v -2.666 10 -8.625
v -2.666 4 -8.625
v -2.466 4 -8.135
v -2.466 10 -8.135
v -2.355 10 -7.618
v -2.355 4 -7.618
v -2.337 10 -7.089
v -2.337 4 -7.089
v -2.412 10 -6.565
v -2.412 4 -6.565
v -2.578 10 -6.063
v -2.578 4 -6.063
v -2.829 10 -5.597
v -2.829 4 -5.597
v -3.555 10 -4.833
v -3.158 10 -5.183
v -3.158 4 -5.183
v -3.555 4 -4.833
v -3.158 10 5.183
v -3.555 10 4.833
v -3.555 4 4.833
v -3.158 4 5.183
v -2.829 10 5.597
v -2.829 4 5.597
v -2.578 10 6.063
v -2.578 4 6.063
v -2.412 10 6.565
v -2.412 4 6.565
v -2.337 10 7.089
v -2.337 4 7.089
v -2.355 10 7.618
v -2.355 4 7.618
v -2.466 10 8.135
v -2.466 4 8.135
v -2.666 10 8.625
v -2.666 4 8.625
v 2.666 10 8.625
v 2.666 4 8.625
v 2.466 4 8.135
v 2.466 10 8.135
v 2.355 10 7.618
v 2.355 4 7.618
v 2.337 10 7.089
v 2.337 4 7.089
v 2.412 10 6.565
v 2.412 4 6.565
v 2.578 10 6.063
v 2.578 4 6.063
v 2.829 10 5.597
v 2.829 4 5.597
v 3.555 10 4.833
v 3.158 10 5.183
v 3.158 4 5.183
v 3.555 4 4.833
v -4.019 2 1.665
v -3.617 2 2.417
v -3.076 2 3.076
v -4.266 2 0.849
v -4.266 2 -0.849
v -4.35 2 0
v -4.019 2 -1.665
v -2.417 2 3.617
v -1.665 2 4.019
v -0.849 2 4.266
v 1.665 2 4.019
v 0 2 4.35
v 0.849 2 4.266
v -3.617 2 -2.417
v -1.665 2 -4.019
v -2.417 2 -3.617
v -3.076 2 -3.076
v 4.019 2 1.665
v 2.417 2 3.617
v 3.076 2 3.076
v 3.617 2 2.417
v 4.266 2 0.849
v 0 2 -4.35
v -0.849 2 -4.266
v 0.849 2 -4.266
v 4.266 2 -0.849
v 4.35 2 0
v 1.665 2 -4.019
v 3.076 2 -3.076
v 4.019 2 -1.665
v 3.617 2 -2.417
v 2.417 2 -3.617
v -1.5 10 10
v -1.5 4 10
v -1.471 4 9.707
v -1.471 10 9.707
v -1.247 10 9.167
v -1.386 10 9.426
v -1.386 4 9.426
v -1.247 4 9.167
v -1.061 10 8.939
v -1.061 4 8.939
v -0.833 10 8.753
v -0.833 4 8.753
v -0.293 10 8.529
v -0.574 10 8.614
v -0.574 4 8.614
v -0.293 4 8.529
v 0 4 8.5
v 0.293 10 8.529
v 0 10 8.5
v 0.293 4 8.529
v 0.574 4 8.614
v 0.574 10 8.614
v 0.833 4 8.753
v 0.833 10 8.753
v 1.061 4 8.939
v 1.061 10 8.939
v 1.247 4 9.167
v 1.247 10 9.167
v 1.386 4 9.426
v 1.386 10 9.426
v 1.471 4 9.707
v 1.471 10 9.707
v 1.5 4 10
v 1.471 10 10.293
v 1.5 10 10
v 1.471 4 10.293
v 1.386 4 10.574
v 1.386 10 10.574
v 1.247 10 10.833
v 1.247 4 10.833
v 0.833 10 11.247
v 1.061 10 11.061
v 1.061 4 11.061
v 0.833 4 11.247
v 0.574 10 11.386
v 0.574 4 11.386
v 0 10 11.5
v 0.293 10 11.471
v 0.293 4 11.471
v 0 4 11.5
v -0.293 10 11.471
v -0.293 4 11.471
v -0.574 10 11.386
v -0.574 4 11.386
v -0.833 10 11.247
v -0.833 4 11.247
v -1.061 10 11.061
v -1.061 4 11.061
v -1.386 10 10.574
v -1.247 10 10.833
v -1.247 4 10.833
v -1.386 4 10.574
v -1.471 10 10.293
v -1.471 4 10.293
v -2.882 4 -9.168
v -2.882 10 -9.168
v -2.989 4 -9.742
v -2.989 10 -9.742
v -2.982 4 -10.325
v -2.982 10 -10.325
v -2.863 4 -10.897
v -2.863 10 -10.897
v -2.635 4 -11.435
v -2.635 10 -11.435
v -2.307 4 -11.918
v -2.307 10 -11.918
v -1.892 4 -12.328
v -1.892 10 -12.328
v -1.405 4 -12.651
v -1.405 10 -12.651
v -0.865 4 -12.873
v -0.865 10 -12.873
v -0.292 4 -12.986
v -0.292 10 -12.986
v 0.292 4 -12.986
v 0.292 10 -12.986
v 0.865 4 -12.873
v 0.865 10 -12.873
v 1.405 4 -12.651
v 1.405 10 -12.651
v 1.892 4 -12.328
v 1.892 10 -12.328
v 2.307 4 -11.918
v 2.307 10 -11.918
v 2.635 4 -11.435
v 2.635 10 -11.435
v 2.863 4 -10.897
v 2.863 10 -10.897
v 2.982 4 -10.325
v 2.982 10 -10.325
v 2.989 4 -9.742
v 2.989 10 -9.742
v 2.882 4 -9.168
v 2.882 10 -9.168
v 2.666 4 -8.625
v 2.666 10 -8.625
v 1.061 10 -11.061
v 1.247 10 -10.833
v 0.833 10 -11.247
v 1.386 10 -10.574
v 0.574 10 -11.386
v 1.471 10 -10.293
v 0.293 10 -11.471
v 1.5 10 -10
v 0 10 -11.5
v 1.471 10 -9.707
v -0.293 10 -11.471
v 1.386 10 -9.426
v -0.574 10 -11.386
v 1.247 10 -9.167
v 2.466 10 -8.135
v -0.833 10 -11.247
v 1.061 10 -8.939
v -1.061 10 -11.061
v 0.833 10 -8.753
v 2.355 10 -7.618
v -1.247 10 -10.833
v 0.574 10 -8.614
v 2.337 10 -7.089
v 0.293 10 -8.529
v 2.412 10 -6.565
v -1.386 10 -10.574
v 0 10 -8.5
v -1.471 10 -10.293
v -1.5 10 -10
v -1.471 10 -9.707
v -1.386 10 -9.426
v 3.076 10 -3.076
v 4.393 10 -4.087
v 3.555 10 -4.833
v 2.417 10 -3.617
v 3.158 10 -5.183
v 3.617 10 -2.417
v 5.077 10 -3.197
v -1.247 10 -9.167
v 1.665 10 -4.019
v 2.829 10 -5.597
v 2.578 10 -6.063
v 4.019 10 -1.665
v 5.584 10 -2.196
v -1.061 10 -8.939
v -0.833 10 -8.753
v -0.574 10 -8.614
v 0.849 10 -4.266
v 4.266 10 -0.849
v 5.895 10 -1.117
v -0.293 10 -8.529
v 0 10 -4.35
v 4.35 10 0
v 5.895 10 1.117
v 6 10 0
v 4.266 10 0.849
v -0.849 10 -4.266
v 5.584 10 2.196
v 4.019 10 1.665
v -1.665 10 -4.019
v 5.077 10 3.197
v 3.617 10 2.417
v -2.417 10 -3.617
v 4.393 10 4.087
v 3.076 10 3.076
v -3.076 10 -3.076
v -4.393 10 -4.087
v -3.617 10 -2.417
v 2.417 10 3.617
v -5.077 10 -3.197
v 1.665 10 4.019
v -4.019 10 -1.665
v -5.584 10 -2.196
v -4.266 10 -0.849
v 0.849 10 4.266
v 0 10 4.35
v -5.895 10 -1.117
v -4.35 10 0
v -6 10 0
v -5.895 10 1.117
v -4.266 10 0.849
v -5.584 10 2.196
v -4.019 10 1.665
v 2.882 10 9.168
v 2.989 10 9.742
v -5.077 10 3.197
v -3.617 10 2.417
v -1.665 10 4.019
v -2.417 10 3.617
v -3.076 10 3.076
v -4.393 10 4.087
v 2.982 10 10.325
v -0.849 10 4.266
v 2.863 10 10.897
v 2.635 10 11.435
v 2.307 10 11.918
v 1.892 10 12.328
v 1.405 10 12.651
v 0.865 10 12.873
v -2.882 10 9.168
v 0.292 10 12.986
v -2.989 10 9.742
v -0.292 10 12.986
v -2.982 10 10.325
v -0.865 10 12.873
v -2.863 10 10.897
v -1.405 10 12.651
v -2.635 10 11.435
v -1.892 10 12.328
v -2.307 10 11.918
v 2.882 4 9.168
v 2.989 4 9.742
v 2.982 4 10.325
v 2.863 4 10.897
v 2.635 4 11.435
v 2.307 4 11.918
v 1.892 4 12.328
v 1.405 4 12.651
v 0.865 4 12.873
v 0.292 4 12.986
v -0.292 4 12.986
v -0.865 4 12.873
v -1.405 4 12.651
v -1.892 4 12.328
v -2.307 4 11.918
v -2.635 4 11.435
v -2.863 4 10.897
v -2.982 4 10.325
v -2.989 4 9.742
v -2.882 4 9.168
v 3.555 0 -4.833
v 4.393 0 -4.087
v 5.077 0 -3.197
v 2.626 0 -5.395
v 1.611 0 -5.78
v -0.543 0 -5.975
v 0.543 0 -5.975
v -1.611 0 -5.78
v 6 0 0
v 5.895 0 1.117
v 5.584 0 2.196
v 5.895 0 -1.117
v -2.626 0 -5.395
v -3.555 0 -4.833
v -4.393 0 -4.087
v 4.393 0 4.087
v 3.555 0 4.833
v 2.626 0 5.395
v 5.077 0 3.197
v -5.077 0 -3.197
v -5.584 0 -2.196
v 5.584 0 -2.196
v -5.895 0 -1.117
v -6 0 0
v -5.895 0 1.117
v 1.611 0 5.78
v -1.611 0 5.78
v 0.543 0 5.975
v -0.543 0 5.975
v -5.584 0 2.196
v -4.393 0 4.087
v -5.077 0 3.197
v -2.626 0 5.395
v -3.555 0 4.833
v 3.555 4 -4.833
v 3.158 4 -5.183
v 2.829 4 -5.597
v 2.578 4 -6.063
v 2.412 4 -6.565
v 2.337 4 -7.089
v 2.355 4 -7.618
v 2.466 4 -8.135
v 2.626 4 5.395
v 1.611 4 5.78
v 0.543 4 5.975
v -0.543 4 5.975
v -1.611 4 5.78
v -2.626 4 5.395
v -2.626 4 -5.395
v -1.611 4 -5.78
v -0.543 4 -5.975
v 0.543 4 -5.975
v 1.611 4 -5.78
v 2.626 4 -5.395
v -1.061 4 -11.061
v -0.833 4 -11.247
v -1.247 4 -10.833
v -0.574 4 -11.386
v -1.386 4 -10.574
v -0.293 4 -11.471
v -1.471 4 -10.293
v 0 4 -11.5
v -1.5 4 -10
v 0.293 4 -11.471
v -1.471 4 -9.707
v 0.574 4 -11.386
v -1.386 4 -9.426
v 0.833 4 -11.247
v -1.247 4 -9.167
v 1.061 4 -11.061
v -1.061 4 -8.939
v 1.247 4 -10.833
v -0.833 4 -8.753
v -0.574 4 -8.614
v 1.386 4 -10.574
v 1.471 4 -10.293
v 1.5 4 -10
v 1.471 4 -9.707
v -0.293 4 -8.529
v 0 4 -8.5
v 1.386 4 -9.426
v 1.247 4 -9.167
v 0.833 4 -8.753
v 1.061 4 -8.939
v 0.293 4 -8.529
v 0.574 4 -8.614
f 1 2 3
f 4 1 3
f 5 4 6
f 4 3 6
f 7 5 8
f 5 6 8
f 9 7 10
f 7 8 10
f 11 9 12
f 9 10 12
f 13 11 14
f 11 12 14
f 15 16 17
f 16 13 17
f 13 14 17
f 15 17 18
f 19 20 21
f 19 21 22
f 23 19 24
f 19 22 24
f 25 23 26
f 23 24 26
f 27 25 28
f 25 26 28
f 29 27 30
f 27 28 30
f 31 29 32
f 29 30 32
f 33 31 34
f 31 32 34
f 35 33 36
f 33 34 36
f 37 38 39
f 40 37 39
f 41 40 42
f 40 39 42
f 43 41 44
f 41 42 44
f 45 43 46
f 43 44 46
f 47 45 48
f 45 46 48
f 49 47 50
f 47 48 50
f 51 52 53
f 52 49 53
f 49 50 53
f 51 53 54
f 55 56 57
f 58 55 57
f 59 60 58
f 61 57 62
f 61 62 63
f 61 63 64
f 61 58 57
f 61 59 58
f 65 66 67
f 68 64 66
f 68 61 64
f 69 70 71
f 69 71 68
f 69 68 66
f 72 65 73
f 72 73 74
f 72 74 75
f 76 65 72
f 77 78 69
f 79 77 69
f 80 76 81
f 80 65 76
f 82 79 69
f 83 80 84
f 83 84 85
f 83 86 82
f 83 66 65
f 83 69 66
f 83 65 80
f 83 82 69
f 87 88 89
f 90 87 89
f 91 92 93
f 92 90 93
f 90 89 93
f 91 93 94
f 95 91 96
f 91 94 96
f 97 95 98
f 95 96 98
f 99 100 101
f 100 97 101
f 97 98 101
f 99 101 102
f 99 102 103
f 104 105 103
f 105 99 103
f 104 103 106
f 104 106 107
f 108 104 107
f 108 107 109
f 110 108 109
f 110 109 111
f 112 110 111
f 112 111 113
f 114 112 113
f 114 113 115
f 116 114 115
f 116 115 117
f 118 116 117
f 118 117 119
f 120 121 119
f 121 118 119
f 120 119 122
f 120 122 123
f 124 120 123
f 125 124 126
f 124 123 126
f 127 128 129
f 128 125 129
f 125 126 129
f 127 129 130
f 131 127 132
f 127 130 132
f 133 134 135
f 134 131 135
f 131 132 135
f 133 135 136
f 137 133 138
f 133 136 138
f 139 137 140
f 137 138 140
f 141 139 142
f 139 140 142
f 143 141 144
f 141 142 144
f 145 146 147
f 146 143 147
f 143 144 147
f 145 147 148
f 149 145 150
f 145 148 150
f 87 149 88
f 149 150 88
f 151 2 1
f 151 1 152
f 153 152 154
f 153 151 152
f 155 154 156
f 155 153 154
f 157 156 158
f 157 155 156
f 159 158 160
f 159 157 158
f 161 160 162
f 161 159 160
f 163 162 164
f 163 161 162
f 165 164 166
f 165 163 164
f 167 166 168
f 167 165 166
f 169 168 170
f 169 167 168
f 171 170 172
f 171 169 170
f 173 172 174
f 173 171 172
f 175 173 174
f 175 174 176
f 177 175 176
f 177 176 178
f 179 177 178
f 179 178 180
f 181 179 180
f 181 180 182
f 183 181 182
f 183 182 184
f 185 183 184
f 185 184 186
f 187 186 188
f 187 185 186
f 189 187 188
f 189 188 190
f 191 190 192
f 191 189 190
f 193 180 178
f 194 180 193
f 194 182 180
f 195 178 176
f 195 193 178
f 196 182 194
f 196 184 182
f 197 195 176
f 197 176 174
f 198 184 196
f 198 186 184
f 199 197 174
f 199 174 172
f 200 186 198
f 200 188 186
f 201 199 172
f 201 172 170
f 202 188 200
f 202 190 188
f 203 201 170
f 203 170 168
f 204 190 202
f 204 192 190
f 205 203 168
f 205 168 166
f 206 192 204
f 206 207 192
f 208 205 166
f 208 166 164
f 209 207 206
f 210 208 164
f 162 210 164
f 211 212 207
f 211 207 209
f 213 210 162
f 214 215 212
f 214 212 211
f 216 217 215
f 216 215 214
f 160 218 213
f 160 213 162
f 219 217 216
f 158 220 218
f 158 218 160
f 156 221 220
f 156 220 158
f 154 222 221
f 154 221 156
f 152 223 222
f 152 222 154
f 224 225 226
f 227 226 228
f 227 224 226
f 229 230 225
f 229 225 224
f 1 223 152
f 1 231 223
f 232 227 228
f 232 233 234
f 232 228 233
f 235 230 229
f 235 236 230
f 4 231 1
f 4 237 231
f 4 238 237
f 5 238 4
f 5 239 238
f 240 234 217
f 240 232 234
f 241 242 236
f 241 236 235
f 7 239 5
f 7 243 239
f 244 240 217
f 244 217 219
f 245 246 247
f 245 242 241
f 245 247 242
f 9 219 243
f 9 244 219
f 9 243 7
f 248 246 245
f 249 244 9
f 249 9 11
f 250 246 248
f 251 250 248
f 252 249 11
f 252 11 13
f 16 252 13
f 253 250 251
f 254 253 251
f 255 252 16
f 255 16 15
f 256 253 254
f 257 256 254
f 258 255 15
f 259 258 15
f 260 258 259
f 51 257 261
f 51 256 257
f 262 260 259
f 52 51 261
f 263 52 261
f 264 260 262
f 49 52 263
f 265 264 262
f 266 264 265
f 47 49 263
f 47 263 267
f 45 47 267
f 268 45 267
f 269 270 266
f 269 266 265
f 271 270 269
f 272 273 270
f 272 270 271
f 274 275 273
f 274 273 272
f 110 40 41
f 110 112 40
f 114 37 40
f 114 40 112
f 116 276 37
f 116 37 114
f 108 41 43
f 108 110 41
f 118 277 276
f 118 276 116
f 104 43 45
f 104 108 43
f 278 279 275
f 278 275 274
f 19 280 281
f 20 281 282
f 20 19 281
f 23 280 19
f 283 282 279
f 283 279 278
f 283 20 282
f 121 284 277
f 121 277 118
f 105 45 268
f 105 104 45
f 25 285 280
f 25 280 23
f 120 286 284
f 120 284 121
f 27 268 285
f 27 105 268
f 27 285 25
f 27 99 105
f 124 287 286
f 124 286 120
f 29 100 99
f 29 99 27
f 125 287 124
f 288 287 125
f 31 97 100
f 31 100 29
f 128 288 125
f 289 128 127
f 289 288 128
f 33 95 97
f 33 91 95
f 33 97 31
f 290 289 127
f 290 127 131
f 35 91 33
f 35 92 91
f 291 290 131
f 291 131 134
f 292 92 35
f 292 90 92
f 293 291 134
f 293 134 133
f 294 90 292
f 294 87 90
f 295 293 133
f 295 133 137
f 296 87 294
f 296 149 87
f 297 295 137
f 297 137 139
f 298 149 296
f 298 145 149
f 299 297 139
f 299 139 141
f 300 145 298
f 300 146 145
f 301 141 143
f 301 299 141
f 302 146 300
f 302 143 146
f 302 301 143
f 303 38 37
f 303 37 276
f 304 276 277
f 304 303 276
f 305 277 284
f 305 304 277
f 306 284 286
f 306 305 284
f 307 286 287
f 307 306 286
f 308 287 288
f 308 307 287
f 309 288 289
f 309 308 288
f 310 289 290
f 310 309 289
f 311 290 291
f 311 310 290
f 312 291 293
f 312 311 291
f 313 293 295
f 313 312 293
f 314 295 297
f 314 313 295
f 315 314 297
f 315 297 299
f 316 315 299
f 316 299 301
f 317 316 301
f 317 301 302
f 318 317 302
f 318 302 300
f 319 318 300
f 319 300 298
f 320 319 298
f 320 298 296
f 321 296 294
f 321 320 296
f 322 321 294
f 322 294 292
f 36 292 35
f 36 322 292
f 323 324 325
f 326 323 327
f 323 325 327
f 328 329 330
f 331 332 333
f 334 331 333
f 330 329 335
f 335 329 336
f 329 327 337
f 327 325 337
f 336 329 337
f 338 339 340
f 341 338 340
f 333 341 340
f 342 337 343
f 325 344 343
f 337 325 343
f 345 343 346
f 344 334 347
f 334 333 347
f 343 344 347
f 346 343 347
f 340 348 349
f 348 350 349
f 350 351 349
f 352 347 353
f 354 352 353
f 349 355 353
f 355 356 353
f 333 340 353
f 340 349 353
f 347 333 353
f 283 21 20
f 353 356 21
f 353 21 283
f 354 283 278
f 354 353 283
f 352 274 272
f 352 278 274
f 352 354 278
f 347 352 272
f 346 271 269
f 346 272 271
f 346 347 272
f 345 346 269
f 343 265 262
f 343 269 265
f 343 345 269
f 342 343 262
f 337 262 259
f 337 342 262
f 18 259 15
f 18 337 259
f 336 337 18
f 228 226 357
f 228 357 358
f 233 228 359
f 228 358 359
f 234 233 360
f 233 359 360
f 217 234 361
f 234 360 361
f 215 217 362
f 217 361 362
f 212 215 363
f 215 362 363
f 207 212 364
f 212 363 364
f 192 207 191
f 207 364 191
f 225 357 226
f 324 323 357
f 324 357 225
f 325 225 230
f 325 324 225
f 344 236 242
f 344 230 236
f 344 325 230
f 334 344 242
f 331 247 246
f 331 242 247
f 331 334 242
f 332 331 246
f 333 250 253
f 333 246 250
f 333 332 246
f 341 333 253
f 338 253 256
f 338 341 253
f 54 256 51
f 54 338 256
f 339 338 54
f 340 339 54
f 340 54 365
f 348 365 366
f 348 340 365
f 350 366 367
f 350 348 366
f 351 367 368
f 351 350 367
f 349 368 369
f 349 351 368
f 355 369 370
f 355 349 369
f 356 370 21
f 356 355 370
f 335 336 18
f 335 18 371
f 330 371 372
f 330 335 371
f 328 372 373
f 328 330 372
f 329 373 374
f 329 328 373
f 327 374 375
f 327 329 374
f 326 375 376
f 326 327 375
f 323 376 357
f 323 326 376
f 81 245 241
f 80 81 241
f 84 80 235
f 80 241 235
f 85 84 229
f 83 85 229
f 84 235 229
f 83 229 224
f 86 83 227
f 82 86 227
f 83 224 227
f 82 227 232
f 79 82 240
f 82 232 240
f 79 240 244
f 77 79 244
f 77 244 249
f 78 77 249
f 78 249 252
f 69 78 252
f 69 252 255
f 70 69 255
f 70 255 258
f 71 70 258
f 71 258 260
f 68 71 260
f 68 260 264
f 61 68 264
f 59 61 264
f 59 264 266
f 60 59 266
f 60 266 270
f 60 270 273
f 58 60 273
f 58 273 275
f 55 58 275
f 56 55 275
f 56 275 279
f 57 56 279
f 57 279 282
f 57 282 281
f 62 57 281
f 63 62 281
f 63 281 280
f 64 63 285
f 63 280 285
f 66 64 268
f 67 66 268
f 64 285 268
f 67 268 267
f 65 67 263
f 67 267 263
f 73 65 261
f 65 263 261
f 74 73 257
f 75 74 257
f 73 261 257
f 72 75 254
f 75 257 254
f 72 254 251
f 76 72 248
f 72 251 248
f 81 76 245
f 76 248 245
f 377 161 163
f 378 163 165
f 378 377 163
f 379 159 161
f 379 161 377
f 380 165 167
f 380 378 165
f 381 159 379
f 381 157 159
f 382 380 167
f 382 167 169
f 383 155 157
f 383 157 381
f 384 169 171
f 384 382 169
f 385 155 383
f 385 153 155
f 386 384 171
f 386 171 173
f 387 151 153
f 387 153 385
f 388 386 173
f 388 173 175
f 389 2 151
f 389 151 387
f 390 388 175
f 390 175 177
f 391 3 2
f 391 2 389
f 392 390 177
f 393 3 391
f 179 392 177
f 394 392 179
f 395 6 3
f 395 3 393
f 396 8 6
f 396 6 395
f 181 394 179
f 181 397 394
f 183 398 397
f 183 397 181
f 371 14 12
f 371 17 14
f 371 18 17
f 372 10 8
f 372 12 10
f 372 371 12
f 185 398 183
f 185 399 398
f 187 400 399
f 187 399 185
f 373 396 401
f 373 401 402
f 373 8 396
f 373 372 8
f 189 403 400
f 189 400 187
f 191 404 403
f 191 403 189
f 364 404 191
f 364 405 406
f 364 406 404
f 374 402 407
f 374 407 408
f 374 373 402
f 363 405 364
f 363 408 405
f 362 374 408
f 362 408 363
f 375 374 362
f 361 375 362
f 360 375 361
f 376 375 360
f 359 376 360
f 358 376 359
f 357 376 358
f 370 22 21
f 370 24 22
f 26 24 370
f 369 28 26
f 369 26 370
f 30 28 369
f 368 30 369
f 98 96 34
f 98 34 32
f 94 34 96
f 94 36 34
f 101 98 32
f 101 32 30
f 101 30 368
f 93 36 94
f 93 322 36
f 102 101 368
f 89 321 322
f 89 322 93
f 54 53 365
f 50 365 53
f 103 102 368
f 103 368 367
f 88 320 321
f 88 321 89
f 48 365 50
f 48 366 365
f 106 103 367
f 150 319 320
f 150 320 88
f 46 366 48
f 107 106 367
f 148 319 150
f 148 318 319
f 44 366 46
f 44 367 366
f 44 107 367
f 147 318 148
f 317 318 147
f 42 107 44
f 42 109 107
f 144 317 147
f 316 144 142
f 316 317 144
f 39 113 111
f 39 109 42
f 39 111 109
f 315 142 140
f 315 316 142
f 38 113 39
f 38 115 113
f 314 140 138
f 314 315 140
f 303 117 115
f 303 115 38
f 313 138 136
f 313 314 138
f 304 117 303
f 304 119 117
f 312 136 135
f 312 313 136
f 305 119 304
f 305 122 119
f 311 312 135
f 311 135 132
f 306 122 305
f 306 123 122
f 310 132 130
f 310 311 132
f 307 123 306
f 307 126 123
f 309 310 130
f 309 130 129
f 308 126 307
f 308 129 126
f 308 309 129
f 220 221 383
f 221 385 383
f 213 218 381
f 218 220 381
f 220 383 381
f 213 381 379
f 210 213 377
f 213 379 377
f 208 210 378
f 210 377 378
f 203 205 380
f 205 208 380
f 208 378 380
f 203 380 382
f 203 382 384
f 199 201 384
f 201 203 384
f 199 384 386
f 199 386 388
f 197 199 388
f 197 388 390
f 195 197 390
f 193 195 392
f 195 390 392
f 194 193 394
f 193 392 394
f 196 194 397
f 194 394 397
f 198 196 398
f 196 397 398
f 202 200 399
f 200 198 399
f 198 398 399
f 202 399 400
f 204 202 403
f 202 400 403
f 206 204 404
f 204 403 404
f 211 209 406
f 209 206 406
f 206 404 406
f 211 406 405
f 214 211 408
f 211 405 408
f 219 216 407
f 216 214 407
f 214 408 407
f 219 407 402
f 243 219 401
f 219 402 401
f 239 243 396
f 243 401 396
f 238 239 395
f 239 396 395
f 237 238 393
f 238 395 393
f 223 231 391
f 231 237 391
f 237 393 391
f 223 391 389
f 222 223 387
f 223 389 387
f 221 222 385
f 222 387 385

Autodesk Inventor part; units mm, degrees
ref_plane "YZ Plane" through (0, 0, 0) normal (1, 0, 0) x (0, 1, 0)
ref_plane "XZ Plane" through (0, 0, 0) normal (0, 1, 0) x (-1, 0, 0)
ref_plane "XY Plane" through (0, 0, 0) normal (0, 0, 1) x (1, 0, 0)
sketch "Sketch1" plane through (0, 0, 0) normal (0, 1, 0) x (-1, 0, 0)
  circle A0 centre (0, 10) radius 1.5
  circle A1 centre (0, -10) radius 1.5
  arc A2 (2.6663, 8.625) -> (-2.6663, 8.625) centre (0, 10) ccw
  arc A3 (-2.6663, -8.625) -> (2.6663, -8.625) centre (0, -10) ccw
  arc A4 (2.6663, 8.625) -> (3.5551, 4.8333) centre (5.3327, 7.25) ccw
  arc A5 (-3.5551, 4.8333) -> (-2.6663, 8.625) centre (-5.3327, 7.25) ccw
  arc A6 (3.5551, -4.8333) -> (2.6663, -8.625) centre (5.3327, -7.25) ccw
  arc A7 (-2.6663, -8.625) -> (-3.5551, -4.8333) centre (-5.3327, -7.25) ccw
  arc A8 (-3.5551, 4.8333) -> (-3.5551, -4.8333) centre (0, 0) ccw
  arc A9 (3.5551, -4.8333) -> (3.5551, 4.8333) centre (0, 0) ccw
  dimension "d1" = 10
  dimension "d2" = 20
  dimension "d3" = 3
  dimension "d4" = 6
  dimension "d5" = 6
  dimension "d6" = 6
  dimension "d7" = 6
  dimension "d8" = 3
extrude "Extrusion1" add sketch "Sketch1" along normal blind 10
sketch "Sketch2" plane through (0, 10, 0) normal (0, 1, 0) x (1, 0, 0)
  circle A0 centre (0, 0) radius 4.35
  dimension "d11" = 8.7
extrude "Extrusion2" cut sketch "Sketch2" against normal blind 8
sketch "Sketch3" plane through (0, 0, 0) normal (0, -1, 0) x (1, 0, 0)
  circle A0 centre (0, 10) radius 1.5 projected
  arc A1 (2.6663, 8.625) -> (-2.6663, 8.625) centre (0, 10) ccw
  circle A2 centre (0, -10) radius 1.5 projected
  arc A3 (-2.6663, -8.625) -> (2.6663, -8.625) centre (0, -10) ccw
  arc A4 (2.6663, 8.625) -> (-2.6663, 8.625) centre (0, 10) ccw projected
  arc A5 (2.6663, 8.625) -> (3.5551, 4.8333) centre (5.3327, 7.25) ccw
  arc A6 (-3.5551, 4.8333) -> (-2.6663, 8.625) centre (-5.3327, 7.25) ccw
  arc A7 (-2.6663, -8.625) -> (-3.5551, -4.8333) centre (-5.3327, -7.25) ccw
  arc A8 (3.5551, -4.8333) -> (2.6663, -8.625) centre (5.3327, -7.25) ccw
  arc A9 (3.5551, -4.8333) -> (3.5551, 4.8333) centre (0, 0) ccw projected
  arc A10 (2.6663, 8.625) -> (3.5551, 4.8333) centre (5.3327, 7.25) ccw projected
  arc A11 (-3.5551, 4.8333) -> (-2.6663, 8.625) centre (-5.3327, 7.25) ccw projected
  arc A12 (-2.6663, -8.625) -> (-3.5551, -4.8333) centre (-5.3327, -7.25) ccw projected
  arc A13 (3.5551, -4.8333) -> (2.6663, -8.625) centre (5.3327, -7.25) ccw projected
  arc A14 (-3.5551, 4.8333) -> (-3.5551, -4.8333) centre (0, 0) ccw projected
  arc A15 (-2.6663, -8.625) -> (2.6663, -8.625) centre (0, -10) ccw projected
  arc A16 (3.5551, 4.8333) -> (-3.5551, 4.8333) centre (0, 0) ccw
  arc A17 (-3.5551, -4.8333) -> (3.5551, -4.8333) centre (0, 0) ccw
extrude "Extrusion3" cut sketch "Sketch3" against normal blind 4 contours A5 A16 A6 A1 | A8 A3 A7 A17
properties part number "Cap"
